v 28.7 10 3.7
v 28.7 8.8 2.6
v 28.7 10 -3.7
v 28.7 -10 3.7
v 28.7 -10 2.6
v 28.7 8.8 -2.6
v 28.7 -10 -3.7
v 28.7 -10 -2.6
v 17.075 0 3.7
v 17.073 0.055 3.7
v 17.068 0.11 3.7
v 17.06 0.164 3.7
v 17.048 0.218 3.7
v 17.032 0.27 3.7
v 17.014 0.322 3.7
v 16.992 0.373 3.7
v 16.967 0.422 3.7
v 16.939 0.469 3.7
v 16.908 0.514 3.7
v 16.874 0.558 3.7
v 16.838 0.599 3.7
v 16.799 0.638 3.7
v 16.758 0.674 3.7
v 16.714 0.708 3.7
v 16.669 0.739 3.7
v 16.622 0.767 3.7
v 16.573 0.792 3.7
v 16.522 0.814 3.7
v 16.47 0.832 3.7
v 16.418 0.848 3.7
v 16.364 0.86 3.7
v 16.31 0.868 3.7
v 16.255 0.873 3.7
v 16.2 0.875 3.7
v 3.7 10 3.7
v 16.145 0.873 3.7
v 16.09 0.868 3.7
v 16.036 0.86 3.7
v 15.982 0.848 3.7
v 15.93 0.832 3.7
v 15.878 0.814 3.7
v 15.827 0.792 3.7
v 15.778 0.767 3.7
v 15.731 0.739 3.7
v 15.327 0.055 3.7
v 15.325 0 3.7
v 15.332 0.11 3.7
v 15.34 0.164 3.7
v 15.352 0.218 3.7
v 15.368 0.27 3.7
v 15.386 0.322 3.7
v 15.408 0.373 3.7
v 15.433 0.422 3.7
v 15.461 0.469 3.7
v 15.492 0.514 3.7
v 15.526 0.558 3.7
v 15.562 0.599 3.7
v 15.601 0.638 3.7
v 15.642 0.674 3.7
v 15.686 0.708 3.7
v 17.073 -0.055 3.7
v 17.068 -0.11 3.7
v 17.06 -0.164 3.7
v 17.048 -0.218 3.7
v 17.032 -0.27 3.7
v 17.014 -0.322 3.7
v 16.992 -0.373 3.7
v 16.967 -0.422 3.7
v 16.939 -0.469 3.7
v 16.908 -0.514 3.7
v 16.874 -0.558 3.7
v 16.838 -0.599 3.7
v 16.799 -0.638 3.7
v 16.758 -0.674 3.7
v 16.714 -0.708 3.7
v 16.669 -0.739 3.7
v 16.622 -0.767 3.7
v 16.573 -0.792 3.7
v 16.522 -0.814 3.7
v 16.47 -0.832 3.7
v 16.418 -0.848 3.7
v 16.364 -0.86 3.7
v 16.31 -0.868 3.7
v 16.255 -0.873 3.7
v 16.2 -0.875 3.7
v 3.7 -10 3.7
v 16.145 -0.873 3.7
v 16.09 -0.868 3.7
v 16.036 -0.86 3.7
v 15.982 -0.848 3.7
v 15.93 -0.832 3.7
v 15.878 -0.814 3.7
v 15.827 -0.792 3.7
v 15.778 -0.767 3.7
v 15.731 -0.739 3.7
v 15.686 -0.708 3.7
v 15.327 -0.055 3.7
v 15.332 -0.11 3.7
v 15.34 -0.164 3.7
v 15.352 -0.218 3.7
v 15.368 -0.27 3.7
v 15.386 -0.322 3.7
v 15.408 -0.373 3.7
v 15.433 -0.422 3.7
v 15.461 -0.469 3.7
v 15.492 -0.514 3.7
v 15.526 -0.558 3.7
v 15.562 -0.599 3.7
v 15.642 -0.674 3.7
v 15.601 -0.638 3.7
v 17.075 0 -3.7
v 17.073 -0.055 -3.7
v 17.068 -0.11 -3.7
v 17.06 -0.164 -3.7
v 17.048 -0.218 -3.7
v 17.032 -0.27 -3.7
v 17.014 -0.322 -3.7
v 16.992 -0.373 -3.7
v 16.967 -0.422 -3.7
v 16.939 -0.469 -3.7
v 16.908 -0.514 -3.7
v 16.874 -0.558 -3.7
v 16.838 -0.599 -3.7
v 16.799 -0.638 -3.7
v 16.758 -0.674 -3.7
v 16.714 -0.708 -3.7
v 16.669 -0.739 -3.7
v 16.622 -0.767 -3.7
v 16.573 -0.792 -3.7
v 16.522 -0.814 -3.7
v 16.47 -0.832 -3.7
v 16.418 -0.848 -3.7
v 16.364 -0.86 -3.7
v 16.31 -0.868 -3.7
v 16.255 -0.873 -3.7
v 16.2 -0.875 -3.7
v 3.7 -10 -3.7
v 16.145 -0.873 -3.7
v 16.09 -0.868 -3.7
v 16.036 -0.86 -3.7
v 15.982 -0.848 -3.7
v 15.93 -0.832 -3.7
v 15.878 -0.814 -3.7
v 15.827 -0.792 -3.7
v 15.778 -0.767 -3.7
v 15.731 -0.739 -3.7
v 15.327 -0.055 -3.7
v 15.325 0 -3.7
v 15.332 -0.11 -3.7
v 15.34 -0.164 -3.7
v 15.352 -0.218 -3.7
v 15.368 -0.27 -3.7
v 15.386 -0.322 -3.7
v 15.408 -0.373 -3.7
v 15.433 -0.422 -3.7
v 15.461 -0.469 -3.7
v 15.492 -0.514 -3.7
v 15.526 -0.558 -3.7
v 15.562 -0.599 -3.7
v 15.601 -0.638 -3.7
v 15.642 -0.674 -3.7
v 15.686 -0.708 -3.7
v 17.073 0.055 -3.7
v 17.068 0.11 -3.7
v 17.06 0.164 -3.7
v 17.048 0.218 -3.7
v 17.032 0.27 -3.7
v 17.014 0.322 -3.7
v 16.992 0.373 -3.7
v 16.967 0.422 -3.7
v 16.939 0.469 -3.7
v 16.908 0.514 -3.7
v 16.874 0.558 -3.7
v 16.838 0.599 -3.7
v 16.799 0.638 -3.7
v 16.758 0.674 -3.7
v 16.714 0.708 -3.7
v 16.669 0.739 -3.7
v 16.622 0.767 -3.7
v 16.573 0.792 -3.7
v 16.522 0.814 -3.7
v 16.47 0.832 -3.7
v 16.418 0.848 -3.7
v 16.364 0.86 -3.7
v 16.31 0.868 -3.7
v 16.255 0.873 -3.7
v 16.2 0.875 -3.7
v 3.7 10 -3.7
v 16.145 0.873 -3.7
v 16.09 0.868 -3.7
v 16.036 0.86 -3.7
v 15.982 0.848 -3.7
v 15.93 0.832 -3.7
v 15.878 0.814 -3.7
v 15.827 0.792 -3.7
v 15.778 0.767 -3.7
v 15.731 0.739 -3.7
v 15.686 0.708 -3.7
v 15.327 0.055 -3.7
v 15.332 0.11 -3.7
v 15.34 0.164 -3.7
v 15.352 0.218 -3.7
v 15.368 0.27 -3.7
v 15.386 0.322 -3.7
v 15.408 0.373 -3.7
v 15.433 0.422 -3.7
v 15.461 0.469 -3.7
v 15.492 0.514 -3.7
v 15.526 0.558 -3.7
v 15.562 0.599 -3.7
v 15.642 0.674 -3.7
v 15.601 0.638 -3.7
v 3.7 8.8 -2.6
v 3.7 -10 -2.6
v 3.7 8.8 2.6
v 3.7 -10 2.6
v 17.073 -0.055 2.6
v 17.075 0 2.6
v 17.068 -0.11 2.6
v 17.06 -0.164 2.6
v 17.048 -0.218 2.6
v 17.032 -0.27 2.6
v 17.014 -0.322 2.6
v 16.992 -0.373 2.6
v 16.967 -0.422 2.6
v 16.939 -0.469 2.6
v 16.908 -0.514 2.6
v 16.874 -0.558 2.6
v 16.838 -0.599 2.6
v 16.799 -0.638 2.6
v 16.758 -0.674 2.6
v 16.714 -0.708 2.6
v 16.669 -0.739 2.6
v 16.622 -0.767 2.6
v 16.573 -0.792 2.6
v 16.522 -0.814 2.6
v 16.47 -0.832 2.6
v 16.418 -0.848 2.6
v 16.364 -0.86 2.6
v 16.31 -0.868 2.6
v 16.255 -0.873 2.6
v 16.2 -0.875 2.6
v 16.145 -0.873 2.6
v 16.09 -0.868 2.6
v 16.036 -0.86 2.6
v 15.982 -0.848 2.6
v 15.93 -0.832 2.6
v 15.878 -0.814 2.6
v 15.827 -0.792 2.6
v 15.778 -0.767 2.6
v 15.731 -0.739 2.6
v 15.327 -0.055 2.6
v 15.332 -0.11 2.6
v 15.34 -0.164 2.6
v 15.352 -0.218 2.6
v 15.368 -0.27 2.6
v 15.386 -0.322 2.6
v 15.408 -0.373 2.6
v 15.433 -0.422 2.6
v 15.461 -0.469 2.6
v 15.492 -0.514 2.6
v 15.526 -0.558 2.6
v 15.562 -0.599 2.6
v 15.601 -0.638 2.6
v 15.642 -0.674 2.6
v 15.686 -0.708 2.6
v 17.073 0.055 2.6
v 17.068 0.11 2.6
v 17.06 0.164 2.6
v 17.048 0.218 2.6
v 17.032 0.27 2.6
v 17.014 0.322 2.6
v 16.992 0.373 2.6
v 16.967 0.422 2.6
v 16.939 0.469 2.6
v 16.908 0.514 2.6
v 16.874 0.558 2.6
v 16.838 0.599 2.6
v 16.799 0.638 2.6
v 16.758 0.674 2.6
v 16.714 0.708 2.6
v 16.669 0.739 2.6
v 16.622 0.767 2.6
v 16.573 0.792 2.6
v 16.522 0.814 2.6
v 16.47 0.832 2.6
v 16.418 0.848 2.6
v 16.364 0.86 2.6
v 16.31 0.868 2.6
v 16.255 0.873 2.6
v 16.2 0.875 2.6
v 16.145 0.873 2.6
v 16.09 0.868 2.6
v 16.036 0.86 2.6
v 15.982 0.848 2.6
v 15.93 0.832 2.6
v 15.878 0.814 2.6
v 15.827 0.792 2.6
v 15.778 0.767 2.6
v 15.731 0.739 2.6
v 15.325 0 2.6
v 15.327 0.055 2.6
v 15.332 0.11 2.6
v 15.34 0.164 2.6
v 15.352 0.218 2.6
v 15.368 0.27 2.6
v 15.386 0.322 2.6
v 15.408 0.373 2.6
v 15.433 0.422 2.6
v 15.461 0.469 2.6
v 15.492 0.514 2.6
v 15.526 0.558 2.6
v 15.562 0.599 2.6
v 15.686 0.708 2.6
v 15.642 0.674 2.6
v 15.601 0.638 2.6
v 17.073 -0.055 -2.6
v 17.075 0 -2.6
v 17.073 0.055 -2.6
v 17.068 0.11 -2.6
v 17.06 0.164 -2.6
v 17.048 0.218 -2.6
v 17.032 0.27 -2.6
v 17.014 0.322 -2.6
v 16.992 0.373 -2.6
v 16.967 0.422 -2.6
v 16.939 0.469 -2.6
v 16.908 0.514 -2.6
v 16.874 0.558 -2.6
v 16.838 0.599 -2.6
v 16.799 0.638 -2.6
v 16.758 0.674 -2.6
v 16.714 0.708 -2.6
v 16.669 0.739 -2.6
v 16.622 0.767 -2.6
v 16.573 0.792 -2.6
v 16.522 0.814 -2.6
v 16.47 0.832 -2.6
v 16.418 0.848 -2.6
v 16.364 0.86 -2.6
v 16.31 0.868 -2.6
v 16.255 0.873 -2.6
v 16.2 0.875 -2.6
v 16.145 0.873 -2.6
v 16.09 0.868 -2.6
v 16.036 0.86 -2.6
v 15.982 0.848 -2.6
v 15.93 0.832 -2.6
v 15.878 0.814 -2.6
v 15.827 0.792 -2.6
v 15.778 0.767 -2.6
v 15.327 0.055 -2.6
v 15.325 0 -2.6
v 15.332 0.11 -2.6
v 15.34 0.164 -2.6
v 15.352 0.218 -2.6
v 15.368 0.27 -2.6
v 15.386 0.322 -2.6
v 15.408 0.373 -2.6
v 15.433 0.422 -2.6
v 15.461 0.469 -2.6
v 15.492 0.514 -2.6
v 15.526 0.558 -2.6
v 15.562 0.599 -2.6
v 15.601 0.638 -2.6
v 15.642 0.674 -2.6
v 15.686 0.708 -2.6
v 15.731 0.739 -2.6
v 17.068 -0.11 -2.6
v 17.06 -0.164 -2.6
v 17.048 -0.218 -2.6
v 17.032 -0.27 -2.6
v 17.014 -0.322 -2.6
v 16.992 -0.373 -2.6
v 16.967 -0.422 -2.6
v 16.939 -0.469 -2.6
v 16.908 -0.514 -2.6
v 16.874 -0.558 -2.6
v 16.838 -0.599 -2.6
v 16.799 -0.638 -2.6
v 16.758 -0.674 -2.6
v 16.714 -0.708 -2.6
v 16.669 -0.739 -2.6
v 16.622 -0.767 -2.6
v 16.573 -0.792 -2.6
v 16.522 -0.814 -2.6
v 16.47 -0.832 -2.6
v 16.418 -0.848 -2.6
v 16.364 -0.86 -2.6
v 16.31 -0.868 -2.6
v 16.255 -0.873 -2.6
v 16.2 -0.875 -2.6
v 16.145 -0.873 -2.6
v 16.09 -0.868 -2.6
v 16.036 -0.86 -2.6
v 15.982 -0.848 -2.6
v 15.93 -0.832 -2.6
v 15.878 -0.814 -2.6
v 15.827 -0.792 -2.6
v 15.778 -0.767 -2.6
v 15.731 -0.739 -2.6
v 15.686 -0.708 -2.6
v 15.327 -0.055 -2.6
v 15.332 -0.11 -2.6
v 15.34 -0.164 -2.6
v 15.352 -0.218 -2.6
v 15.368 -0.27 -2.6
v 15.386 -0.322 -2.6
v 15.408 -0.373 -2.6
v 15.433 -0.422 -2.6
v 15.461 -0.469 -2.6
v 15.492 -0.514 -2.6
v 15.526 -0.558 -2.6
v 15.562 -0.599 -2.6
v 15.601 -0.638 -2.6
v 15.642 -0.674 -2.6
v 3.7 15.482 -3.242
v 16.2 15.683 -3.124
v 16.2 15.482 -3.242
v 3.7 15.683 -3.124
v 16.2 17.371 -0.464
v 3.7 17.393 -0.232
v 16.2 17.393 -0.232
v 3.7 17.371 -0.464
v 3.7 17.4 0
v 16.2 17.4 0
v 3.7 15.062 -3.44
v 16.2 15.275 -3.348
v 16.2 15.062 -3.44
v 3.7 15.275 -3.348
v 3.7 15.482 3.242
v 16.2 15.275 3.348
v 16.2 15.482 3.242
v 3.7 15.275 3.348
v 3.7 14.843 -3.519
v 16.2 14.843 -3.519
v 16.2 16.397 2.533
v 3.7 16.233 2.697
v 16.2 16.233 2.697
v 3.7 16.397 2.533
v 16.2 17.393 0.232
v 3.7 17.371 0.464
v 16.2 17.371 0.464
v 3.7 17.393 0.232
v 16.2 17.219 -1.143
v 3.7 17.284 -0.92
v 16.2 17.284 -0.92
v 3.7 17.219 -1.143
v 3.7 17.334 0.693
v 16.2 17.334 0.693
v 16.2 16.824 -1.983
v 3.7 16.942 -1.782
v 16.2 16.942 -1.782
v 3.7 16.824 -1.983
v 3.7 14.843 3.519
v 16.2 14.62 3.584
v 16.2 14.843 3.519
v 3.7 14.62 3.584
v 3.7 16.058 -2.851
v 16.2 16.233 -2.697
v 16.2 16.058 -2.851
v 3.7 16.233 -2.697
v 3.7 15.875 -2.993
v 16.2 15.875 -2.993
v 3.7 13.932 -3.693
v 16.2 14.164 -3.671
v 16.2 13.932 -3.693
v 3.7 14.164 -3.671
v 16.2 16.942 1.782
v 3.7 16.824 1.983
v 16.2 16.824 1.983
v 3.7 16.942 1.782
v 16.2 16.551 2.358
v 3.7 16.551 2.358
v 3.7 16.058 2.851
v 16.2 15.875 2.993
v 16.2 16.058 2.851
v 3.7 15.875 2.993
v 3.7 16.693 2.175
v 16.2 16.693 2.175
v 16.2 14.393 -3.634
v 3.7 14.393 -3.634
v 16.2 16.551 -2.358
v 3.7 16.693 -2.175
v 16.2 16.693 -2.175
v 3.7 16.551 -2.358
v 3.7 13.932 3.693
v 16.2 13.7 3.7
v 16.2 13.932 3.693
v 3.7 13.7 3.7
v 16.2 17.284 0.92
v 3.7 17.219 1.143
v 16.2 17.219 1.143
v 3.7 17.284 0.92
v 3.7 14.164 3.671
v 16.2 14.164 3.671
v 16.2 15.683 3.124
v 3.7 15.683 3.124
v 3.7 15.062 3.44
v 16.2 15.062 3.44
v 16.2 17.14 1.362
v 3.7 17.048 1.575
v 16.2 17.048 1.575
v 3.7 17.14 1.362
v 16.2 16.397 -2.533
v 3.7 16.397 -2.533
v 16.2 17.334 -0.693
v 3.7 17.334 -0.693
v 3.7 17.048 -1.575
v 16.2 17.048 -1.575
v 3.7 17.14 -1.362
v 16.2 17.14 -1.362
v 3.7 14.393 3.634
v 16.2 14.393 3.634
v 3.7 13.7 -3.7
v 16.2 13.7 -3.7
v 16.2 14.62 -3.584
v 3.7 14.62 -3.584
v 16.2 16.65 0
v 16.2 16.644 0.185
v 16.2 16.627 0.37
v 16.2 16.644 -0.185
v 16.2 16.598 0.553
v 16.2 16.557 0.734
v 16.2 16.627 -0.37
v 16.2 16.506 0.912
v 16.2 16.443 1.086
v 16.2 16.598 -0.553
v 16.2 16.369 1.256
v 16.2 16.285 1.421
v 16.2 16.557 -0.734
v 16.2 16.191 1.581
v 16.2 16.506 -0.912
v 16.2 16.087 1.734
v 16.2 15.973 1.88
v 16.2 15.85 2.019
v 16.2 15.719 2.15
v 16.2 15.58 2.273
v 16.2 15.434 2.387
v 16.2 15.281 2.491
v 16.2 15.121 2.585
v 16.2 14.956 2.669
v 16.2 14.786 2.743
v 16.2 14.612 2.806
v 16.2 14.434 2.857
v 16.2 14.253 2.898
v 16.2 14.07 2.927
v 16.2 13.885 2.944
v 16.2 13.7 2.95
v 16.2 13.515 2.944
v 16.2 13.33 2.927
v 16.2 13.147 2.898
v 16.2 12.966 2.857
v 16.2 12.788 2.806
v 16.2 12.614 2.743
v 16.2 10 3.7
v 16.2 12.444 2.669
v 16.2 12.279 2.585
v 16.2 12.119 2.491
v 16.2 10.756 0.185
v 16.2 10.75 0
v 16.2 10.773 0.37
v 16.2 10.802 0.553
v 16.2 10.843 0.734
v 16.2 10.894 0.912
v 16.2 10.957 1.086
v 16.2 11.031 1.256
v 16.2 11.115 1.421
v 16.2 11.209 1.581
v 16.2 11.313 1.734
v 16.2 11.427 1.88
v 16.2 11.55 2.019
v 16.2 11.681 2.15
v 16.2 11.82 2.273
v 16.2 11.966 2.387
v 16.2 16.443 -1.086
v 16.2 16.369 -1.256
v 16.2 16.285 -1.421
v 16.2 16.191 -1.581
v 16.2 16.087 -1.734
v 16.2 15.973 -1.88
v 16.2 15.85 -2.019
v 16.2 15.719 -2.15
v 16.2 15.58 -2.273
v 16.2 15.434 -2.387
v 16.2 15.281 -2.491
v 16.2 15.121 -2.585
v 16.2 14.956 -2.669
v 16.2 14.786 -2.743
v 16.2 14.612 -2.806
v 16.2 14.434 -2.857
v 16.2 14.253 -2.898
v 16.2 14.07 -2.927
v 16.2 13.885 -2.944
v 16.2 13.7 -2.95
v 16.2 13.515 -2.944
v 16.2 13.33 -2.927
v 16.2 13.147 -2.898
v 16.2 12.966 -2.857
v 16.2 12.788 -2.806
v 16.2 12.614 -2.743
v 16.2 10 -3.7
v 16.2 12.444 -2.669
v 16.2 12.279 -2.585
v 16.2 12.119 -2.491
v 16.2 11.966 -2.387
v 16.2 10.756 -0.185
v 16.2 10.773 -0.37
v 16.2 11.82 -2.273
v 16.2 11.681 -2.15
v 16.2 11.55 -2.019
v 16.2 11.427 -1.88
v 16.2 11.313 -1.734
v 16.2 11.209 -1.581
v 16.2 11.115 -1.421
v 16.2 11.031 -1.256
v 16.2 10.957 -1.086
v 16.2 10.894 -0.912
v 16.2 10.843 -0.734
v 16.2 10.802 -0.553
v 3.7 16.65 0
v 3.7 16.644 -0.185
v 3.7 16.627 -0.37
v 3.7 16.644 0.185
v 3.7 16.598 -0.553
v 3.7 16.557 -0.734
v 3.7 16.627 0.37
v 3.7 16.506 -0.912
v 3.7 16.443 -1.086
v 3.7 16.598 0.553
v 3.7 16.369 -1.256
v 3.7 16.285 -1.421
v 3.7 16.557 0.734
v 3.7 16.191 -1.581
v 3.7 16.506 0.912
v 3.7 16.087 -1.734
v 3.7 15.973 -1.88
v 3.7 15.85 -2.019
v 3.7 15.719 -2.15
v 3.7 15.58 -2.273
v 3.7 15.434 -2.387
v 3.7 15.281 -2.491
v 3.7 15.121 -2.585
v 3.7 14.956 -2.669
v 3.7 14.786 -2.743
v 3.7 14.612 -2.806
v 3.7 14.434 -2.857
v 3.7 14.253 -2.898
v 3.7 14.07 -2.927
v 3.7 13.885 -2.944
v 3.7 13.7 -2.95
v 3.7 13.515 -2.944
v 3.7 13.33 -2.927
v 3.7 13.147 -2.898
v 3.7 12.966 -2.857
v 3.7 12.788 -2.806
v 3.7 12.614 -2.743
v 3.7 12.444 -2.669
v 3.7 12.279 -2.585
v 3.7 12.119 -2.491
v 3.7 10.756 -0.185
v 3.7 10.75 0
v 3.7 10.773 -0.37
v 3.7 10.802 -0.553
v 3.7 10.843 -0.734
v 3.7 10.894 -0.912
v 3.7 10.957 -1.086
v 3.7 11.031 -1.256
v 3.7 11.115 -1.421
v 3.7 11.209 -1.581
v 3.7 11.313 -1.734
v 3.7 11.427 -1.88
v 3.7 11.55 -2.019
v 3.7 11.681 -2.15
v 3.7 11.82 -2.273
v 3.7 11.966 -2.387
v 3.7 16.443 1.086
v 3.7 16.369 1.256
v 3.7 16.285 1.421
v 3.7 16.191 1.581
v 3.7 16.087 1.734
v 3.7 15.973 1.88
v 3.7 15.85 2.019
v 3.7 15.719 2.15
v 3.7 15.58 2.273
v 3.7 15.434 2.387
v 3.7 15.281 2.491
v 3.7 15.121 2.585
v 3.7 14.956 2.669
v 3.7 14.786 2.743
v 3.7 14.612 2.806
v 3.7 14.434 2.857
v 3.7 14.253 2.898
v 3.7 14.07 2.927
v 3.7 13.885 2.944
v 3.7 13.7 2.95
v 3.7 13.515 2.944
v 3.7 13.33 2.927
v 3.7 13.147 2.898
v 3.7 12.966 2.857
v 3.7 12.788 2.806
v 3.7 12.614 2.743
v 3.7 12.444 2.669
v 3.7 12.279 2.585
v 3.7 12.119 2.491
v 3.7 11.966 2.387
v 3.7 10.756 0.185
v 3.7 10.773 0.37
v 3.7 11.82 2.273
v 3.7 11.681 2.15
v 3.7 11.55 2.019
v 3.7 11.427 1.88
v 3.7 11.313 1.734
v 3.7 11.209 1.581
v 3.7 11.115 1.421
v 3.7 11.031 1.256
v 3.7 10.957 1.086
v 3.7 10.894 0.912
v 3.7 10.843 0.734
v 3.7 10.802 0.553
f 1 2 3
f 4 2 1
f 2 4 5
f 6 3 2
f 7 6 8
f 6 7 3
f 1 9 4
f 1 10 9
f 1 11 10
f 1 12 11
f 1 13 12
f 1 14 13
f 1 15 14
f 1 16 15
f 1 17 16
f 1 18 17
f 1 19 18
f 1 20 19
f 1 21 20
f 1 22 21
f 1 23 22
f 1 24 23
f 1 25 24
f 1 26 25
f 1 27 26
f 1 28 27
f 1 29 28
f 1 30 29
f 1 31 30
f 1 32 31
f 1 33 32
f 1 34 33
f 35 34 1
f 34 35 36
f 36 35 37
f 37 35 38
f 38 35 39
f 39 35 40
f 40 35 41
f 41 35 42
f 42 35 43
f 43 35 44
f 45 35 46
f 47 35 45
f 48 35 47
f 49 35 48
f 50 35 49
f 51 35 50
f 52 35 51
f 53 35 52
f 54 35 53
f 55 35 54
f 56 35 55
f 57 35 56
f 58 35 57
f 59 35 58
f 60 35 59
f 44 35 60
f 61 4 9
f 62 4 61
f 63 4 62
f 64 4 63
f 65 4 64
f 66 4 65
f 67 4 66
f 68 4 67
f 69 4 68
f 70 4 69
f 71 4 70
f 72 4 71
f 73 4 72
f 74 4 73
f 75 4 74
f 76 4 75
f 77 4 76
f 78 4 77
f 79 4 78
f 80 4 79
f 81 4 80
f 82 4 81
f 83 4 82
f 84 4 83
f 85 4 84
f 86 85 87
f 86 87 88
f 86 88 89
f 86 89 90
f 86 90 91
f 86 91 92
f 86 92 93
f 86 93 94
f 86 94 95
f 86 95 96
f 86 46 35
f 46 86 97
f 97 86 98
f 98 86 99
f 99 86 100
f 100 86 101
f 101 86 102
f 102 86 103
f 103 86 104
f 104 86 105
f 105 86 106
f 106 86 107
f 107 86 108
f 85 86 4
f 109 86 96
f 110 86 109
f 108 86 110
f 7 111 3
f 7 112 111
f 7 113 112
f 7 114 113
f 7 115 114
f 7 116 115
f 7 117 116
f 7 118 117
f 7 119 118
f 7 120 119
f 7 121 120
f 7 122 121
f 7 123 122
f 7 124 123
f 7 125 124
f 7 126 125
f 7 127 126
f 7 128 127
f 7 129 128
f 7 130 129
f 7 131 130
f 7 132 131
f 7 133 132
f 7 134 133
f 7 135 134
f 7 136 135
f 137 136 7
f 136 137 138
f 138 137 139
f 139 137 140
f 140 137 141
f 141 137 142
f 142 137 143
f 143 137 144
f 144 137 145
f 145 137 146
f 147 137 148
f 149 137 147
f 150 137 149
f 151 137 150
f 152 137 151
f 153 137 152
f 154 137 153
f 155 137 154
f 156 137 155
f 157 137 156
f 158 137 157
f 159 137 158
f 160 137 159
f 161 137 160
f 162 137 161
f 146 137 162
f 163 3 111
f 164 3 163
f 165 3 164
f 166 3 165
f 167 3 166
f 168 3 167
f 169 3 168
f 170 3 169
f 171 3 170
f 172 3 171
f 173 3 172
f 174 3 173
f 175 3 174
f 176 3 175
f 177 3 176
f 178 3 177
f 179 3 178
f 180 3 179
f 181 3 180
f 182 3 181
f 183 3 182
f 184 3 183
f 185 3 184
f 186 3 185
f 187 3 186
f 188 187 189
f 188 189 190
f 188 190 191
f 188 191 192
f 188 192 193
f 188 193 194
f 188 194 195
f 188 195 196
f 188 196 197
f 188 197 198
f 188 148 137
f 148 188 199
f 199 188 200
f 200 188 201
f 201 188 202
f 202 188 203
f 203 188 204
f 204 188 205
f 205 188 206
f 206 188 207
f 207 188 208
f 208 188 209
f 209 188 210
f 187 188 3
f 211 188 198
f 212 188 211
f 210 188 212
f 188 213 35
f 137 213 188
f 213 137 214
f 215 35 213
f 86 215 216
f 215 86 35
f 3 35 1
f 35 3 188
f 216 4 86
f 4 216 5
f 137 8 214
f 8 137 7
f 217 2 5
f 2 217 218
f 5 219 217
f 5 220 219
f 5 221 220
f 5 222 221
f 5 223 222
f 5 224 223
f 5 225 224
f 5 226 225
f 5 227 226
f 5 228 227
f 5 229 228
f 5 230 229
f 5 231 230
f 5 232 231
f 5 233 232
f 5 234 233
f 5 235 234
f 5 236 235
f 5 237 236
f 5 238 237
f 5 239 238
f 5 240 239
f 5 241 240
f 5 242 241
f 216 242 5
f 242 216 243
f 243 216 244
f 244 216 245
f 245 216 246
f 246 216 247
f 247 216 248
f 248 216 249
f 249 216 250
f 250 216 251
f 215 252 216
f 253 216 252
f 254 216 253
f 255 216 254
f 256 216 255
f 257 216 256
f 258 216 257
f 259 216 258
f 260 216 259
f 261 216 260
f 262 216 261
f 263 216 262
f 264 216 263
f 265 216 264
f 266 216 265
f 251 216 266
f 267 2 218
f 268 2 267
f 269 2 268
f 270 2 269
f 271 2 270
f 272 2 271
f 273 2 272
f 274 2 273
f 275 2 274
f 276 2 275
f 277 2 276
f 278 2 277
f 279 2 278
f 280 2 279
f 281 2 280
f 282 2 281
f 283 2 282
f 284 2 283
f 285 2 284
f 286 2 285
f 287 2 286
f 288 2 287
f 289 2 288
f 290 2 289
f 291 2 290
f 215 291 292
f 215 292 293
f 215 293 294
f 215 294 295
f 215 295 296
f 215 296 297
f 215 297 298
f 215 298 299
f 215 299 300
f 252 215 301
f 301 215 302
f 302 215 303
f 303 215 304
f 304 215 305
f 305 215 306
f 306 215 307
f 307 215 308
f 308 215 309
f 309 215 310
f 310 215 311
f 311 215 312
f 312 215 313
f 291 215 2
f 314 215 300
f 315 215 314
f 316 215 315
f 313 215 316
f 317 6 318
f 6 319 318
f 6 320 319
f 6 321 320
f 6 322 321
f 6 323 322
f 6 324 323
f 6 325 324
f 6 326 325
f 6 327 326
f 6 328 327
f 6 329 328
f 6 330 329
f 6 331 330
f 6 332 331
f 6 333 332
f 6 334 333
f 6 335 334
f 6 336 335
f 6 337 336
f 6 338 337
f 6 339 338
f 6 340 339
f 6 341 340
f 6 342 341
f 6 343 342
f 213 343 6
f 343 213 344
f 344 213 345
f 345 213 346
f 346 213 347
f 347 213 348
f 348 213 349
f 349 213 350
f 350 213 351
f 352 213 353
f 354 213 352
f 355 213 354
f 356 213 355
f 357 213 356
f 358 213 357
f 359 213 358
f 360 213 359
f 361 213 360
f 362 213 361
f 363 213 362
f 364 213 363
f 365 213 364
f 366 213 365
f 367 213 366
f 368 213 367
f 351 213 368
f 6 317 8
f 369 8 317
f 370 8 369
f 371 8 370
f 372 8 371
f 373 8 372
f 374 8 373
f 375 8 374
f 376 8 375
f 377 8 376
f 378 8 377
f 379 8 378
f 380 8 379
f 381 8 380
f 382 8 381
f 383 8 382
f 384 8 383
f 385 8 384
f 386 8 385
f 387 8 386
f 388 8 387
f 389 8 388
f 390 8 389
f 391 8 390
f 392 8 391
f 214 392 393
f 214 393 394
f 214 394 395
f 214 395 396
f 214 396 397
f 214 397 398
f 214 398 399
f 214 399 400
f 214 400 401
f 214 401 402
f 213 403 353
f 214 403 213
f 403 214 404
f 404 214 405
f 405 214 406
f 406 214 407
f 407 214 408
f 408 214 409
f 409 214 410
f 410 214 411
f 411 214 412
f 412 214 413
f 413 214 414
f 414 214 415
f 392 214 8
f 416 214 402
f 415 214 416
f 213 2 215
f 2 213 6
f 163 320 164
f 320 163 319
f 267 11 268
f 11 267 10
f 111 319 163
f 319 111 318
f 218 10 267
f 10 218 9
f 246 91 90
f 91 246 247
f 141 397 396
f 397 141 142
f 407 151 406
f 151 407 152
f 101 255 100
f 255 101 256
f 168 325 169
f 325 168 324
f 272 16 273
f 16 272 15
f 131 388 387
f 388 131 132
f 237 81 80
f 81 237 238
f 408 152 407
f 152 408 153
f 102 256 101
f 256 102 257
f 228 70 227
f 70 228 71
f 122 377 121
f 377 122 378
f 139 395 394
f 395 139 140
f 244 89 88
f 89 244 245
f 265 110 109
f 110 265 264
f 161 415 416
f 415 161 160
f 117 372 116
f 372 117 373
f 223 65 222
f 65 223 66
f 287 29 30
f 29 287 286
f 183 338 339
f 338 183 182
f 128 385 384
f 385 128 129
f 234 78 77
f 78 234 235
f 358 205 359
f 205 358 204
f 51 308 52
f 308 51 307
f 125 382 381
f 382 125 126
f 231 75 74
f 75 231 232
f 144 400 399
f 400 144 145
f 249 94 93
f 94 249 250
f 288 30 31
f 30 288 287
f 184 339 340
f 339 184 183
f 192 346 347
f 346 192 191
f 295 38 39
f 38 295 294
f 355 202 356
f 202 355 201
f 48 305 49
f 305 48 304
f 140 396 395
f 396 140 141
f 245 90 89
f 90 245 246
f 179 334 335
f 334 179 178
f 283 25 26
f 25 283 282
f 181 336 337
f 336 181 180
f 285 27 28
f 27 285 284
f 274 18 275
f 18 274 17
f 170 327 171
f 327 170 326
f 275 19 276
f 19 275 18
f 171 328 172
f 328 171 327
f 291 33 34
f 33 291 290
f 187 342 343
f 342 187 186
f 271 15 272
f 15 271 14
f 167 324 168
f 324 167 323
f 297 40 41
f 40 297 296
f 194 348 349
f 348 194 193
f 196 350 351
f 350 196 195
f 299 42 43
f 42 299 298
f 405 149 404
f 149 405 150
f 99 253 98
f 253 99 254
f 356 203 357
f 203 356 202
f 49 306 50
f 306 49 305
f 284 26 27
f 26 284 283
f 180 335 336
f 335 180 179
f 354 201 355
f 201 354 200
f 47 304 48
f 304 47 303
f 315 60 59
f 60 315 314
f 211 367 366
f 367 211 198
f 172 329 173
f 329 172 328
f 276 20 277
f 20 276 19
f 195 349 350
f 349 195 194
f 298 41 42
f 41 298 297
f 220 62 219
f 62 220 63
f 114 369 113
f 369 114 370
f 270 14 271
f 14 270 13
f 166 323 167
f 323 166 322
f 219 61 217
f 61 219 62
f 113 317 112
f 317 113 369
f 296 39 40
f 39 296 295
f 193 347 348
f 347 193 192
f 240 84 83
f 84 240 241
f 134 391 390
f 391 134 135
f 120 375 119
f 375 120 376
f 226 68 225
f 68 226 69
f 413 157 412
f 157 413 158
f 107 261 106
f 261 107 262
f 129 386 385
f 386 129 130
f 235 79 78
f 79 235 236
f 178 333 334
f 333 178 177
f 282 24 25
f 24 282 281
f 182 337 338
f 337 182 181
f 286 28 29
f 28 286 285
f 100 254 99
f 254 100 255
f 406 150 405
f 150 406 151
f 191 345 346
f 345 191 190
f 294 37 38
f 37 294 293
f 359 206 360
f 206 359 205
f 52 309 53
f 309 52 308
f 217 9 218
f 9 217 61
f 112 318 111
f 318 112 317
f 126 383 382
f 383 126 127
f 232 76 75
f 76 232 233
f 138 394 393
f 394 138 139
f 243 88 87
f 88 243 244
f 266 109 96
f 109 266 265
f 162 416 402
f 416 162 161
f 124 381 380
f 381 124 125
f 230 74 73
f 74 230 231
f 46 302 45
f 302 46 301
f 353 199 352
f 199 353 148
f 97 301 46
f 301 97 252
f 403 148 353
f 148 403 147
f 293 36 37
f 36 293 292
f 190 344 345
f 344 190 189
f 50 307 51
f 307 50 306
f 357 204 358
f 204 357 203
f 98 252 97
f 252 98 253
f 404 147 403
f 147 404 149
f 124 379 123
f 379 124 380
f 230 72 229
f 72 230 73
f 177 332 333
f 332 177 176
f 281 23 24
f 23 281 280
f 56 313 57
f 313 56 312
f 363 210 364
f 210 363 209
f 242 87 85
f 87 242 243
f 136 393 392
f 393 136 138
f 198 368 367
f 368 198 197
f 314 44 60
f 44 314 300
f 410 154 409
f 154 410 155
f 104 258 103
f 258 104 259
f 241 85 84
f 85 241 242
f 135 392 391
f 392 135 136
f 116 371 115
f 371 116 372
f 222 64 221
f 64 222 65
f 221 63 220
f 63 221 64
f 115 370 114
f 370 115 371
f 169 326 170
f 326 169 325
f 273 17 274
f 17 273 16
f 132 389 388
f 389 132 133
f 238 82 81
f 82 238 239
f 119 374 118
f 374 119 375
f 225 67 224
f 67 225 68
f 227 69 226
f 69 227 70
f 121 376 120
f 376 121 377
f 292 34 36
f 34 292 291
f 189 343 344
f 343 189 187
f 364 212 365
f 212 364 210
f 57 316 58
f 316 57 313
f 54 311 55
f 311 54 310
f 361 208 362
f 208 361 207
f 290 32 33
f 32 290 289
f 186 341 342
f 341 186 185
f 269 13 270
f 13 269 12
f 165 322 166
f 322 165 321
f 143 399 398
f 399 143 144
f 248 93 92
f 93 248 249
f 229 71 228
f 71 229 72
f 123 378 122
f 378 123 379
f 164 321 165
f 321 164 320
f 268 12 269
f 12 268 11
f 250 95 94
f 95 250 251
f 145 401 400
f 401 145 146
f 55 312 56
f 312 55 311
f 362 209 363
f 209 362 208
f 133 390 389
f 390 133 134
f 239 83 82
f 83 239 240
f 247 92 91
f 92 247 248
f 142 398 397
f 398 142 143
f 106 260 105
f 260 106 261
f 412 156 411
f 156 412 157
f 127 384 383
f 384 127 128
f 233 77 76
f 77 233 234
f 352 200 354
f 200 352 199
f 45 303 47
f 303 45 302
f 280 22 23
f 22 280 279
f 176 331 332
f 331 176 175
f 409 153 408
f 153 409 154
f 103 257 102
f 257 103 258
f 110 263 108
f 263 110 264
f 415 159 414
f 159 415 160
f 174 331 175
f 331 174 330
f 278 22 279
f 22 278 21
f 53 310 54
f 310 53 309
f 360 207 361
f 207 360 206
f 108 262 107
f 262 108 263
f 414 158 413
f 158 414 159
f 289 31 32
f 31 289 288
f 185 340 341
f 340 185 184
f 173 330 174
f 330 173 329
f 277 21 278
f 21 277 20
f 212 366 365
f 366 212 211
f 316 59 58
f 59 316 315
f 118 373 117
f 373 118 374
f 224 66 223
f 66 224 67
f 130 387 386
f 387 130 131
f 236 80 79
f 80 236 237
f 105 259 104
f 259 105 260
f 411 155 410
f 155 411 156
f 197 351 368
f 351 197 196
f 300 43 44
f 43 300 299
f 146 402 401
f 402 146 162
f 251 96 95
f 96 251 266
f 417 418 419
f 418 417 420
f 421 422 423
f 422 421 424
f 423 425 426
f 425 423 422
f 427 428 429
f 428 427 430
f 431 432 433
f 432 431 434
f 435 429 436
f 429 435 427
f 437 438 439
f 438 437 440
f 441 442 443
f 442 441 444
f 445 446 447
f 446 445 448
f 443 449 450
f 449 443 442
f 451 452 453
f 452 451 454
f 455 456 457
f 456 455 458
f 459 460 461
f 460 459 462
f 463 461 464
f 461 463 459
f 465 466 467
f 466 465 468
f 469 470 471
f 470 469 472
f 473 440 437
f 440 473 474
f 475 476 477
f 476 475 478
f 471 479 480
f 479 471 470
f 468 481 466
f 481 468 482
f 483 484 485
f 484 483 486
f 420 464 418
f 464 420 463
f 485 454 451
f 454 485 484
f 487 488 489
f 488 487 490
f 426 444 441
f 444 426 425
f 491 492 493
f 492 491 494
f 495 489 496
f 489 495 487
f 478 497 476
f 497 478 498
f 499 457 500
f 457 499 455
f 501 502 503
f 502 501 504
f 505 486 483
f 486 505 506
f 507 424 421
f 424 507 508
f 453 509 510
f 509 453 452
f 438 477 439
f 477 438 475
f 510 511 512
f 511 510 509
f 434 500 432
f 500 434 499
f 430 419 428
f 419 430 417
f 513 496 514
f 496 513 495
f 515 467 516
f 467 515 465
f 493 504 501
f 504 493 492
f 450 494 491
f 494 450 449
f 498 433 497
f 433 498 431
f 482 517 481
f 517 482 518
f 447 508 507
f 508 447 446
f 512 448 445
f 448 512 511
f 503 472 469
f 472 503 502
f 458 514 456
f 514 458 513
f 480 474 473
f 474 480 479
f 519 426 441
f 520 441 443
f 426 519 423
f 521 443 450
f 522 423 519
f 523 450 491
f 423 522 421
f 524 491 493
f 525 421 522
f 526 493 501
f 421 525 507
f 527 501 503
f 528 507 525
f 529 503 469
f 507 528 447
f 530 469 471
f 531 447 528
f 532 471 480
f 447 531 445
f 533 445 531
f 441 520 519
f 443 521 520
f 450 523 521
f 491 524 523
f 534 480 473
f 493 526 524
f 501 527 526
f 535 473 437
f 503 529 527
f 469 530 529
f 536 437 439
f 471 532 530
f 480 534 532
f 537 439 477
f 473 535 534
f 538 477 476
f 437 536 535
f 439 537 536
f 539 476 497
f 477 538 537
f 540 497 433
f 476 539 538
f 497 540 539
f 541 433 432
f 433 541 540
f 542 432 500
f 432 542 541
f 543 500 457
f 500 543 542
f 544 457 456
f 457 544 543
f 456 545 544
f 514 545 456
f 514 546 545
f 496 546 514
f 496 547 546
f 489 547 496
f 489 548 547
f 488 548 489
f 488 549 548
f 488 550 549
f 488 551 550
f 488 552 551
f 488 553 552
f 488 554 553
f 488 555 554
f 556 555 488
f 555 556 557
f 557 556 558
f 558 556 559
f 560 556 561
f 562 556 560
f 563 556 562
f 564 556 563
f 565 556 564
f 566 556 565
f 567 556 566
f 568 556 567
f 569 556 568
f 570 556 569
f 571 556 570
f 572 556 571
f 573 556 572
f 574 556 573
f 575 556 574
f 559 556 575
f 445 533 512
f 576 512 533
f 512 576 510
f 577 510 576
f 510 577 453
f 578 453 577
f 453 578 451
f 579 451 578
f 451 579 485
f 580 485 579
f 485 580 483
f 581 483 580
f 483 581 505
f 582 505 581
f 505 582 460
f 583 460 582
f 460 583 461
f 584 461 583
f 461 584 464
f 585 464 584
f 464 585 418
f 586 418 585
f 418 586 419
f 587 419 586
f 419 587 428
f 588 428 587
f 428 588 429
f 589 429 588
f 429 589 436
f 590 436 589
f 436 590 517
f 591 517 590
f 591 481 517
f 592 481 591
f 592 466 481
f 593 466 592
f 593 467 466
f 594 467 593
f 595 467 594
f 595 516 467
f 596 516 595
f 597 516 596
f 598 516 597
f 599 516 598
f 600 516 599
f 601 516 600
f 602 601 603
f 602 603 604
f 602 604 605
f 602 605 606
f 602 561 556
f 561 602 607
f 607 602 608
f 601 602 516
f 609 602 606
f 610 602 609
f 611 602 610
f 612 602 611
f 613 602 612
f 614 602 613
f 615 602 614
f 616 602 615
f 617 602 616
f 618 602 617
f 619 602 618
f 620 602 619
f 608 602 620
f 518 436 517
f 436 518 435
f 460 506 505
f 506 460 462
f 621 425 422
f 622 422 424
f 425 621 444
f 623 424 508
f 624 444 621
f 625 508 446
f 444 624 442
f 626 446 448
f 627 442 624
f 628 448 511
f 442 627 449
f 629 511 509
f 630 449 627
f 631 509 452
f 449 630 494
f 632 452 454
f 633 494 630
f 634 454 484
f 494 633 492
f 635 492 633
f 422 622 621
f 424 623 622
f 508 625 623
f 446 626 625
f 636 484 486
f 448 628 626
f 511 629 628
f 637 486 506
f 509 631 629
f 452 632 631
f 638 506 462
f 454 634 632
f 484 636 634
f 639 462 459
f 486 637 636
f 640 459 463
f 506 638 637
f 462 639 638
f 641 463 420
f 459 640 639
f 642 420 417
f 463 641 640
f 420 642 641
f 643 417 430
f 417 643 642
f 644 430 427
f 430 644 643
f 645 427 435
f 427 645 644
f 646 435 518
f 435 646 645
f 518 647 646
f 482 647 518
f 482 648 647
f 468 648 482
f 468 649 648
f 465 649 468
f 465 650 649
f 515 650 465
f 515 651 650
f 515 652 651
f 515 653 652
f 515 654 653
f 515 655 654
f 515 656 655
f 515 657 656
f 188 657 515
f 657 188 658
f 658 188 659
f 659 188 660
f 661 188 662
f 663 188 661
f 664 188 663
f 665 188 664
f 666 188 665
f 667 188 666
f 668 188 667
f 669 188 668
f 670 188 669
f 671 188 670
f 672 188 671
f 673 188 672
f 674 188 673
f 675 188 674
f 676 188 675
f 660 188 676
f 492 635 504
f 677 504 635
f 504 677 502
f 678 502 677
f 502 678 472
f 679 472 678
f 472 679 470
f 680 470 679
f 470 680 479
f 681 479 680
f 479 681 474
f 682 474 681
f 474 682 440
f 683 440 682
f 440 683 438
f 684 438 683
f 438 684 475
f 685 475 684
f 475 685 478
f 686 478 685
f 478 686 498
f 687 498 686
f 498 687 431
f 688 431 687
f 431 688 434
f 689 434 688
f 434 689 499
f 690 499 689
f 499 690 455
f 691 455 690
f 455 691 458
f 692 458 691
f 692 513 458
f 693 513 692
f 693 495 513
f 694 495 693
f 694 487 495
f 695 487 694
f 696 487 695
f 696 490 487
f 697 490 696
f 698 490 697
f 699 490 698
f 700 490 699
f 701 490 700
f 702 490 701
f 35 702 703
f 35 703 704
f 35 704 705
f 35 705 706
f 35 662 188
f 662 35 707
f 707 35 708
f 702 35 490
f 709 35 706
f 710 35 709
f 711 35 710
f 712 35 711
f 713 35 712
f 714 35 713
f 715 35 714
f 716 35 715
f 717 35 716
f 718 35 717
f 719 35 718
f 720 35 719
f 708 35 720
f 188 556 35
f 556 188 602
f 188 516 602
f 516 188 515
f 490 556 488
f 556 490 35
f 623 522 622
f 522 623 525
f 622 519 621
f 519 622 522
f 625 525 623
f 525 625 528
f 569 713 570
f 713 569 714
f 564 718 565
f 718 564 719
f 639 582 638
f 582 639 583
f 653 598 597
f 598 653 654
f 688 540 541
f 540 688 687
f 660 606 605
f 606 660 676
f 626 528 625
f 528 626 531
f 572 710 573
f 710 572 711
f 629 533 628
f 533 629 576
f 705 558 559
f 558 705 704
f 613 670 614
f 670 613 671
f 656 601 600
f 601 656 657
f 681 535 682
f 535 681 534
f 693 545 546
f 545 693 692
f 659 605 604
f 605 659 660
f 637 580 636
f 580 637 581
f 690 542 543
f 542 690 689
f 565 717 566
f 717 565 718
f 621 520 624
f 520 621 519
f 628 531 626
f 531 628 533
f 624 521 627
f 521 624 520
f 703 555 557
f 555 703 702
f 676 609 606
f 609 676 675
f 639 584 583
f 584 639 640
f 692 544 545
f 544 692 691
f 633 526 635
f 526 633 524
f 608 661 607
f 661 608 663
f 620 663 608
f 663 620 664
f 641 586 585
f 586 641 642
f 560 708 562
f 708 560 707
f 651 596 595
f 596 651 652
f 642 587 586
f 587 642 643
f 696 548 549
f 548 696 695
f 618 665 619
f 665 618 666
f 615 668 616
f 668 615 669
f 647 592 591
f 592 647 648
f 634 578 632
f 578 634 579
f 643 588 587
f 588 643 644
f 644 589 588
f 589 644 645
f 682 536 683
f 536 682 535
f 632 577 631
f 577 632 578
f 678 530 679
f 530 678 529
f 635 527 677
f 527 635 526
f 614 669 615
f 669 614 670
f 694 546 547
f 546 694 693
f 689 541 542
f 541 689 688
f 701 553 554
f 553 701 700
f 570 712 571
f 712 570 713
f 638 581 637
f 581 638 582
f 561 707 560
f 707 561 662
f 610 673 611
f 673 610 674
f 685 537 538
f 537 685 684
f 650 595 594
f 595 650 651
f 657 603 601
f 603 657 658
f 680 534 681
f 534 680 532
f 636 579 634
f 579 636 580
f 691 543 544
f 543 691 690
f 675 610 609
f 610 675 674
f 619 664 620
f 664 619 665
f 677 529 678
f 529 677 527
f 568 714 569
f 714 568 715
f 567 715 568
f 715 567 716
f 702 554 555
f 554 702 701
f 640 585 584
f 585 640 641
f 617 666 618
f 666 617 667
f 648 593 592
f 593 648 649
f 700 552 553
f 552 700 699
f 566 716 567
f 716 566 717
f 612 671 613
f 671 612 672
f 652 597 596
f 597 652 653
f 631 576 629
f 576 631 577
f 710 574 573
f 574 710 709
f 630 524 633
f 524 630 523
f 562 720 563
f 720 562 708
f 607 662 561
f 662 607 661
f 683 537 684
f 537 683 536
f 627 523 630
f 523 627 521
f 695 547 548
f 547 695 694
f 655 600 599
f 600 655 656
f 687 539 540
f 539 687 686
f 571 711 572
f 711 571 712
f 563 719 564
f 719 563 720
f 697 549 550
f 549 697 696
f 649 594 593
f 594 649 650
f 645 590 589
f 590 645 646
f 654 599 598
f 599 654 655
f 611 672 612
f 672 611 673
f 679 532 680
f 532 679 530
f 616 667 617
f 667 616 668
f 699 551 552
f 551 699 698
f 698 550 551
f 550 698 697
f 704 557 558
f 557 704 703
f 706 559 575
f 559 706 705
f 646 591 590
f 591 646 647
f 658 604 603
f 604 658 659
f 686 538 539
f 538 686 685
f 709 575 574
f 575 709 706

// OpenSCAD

//celkovy cas - 3:11

//variablength_of_connectors
/* [Hidden] */
//fragment number
$fn = 100;

/* [Main] */
//thickness of desks in mm
thickness_of_desks=5;
//thickness of walls in mm
thickness_of_walls = 1.2;
//length of connectors in mm
length_of_connectors = 25; 
//width of connectors in mm 
width_of_connectors = 20;

secure_filament_thickness = 1.75; //[1.75,3.0]

connector();

translate([thickness_of_desks/2+thickness_of_walls+length_of_connectors/2,thickness_of_desks/2+thickness_of_walls+width_of_connectors/2,0])rotate([-90,0,90])difference(){
union(){
cylinder(h=length_of_connectors/2, d=thickness_of_walls+thickness_of_walls+thickness_of_desks);
translate([-(thickness_of_desks+thickness_of_walls+thickness_of_walls)/2,-(thickness_of_desks+thickness_of_walls+thickness_of_walls)/2,0])cube([thickness_of_walls+thickness_of_desks/2,thickness_of_desks+thickness_of_walls+thickness_of_walls,length_of_connectors/2]);
}    cylinder(h=length_of_connectors/2, d=thickness_of_desks+3*thickness_of_walls/4);
}

module connector(){
    translate([(thickness_of_desks+(thickness_of_walls*2))/2,-width_of_connectors/2,-(thickness_of_desks+(thickness_of_walls*2))/2])difference(){
cube([length_of_connectors,width_of_connectors,thickness_of_desks+(thickness_of_walls*2)]);
translate([0,-thickness_of_walls,thickness_of_walls-0.1])cube([length_of_connectors,width_of_connectors,thickness_of_desks+0.2]);
translate([length_of_connectors/2,width_of_connectors/2,0])cylinder(h=thickness_of_desks+(thickness_of_walls*2), d=secure_filament_thickness );
}

}


module arc(){
translate([(0.1+(length_of_connectors/2)-secure_filament_thickness)+thickness_of_desks/2,width_of_connectors/2,-((0.1+(length_of_connectors/2)-secure_filament_thickness)+thickness_of_desks/2)])rotate([90,270,0])difference(){
intersection(){
union(){
cylinder(h=width_of_connectors, r = (length_of_connectors/2)-secure_filament_thickness);
cube([(length_of_connectors/2)-secure_filament_thickness,(length_of_connectors/2)-secure_filament_thickness,thickness_of_walls]);  
}
cube([(length_of_connectors/2)-secure_filament_thickness,(length_of_connectors/2)-secure_filament_thickness,width_of_connectors]);
}
cylinder(h=width_of_connectors, r = (length_of_connectors/2)-(secure_filament_thickness+thickness_of_walls-0.1));
}
}
module hinges(){
translate([3+thickness_of_desks/2+0.1,0,length_of_connectors-7.5+secure_filament_thickness/2])difference(){
union(){
cylinder(h=5, d=5);
translate([-3,-2.5,0])cube([3,5,5]);
}    cylinder(h=5, d=3);
}

}

